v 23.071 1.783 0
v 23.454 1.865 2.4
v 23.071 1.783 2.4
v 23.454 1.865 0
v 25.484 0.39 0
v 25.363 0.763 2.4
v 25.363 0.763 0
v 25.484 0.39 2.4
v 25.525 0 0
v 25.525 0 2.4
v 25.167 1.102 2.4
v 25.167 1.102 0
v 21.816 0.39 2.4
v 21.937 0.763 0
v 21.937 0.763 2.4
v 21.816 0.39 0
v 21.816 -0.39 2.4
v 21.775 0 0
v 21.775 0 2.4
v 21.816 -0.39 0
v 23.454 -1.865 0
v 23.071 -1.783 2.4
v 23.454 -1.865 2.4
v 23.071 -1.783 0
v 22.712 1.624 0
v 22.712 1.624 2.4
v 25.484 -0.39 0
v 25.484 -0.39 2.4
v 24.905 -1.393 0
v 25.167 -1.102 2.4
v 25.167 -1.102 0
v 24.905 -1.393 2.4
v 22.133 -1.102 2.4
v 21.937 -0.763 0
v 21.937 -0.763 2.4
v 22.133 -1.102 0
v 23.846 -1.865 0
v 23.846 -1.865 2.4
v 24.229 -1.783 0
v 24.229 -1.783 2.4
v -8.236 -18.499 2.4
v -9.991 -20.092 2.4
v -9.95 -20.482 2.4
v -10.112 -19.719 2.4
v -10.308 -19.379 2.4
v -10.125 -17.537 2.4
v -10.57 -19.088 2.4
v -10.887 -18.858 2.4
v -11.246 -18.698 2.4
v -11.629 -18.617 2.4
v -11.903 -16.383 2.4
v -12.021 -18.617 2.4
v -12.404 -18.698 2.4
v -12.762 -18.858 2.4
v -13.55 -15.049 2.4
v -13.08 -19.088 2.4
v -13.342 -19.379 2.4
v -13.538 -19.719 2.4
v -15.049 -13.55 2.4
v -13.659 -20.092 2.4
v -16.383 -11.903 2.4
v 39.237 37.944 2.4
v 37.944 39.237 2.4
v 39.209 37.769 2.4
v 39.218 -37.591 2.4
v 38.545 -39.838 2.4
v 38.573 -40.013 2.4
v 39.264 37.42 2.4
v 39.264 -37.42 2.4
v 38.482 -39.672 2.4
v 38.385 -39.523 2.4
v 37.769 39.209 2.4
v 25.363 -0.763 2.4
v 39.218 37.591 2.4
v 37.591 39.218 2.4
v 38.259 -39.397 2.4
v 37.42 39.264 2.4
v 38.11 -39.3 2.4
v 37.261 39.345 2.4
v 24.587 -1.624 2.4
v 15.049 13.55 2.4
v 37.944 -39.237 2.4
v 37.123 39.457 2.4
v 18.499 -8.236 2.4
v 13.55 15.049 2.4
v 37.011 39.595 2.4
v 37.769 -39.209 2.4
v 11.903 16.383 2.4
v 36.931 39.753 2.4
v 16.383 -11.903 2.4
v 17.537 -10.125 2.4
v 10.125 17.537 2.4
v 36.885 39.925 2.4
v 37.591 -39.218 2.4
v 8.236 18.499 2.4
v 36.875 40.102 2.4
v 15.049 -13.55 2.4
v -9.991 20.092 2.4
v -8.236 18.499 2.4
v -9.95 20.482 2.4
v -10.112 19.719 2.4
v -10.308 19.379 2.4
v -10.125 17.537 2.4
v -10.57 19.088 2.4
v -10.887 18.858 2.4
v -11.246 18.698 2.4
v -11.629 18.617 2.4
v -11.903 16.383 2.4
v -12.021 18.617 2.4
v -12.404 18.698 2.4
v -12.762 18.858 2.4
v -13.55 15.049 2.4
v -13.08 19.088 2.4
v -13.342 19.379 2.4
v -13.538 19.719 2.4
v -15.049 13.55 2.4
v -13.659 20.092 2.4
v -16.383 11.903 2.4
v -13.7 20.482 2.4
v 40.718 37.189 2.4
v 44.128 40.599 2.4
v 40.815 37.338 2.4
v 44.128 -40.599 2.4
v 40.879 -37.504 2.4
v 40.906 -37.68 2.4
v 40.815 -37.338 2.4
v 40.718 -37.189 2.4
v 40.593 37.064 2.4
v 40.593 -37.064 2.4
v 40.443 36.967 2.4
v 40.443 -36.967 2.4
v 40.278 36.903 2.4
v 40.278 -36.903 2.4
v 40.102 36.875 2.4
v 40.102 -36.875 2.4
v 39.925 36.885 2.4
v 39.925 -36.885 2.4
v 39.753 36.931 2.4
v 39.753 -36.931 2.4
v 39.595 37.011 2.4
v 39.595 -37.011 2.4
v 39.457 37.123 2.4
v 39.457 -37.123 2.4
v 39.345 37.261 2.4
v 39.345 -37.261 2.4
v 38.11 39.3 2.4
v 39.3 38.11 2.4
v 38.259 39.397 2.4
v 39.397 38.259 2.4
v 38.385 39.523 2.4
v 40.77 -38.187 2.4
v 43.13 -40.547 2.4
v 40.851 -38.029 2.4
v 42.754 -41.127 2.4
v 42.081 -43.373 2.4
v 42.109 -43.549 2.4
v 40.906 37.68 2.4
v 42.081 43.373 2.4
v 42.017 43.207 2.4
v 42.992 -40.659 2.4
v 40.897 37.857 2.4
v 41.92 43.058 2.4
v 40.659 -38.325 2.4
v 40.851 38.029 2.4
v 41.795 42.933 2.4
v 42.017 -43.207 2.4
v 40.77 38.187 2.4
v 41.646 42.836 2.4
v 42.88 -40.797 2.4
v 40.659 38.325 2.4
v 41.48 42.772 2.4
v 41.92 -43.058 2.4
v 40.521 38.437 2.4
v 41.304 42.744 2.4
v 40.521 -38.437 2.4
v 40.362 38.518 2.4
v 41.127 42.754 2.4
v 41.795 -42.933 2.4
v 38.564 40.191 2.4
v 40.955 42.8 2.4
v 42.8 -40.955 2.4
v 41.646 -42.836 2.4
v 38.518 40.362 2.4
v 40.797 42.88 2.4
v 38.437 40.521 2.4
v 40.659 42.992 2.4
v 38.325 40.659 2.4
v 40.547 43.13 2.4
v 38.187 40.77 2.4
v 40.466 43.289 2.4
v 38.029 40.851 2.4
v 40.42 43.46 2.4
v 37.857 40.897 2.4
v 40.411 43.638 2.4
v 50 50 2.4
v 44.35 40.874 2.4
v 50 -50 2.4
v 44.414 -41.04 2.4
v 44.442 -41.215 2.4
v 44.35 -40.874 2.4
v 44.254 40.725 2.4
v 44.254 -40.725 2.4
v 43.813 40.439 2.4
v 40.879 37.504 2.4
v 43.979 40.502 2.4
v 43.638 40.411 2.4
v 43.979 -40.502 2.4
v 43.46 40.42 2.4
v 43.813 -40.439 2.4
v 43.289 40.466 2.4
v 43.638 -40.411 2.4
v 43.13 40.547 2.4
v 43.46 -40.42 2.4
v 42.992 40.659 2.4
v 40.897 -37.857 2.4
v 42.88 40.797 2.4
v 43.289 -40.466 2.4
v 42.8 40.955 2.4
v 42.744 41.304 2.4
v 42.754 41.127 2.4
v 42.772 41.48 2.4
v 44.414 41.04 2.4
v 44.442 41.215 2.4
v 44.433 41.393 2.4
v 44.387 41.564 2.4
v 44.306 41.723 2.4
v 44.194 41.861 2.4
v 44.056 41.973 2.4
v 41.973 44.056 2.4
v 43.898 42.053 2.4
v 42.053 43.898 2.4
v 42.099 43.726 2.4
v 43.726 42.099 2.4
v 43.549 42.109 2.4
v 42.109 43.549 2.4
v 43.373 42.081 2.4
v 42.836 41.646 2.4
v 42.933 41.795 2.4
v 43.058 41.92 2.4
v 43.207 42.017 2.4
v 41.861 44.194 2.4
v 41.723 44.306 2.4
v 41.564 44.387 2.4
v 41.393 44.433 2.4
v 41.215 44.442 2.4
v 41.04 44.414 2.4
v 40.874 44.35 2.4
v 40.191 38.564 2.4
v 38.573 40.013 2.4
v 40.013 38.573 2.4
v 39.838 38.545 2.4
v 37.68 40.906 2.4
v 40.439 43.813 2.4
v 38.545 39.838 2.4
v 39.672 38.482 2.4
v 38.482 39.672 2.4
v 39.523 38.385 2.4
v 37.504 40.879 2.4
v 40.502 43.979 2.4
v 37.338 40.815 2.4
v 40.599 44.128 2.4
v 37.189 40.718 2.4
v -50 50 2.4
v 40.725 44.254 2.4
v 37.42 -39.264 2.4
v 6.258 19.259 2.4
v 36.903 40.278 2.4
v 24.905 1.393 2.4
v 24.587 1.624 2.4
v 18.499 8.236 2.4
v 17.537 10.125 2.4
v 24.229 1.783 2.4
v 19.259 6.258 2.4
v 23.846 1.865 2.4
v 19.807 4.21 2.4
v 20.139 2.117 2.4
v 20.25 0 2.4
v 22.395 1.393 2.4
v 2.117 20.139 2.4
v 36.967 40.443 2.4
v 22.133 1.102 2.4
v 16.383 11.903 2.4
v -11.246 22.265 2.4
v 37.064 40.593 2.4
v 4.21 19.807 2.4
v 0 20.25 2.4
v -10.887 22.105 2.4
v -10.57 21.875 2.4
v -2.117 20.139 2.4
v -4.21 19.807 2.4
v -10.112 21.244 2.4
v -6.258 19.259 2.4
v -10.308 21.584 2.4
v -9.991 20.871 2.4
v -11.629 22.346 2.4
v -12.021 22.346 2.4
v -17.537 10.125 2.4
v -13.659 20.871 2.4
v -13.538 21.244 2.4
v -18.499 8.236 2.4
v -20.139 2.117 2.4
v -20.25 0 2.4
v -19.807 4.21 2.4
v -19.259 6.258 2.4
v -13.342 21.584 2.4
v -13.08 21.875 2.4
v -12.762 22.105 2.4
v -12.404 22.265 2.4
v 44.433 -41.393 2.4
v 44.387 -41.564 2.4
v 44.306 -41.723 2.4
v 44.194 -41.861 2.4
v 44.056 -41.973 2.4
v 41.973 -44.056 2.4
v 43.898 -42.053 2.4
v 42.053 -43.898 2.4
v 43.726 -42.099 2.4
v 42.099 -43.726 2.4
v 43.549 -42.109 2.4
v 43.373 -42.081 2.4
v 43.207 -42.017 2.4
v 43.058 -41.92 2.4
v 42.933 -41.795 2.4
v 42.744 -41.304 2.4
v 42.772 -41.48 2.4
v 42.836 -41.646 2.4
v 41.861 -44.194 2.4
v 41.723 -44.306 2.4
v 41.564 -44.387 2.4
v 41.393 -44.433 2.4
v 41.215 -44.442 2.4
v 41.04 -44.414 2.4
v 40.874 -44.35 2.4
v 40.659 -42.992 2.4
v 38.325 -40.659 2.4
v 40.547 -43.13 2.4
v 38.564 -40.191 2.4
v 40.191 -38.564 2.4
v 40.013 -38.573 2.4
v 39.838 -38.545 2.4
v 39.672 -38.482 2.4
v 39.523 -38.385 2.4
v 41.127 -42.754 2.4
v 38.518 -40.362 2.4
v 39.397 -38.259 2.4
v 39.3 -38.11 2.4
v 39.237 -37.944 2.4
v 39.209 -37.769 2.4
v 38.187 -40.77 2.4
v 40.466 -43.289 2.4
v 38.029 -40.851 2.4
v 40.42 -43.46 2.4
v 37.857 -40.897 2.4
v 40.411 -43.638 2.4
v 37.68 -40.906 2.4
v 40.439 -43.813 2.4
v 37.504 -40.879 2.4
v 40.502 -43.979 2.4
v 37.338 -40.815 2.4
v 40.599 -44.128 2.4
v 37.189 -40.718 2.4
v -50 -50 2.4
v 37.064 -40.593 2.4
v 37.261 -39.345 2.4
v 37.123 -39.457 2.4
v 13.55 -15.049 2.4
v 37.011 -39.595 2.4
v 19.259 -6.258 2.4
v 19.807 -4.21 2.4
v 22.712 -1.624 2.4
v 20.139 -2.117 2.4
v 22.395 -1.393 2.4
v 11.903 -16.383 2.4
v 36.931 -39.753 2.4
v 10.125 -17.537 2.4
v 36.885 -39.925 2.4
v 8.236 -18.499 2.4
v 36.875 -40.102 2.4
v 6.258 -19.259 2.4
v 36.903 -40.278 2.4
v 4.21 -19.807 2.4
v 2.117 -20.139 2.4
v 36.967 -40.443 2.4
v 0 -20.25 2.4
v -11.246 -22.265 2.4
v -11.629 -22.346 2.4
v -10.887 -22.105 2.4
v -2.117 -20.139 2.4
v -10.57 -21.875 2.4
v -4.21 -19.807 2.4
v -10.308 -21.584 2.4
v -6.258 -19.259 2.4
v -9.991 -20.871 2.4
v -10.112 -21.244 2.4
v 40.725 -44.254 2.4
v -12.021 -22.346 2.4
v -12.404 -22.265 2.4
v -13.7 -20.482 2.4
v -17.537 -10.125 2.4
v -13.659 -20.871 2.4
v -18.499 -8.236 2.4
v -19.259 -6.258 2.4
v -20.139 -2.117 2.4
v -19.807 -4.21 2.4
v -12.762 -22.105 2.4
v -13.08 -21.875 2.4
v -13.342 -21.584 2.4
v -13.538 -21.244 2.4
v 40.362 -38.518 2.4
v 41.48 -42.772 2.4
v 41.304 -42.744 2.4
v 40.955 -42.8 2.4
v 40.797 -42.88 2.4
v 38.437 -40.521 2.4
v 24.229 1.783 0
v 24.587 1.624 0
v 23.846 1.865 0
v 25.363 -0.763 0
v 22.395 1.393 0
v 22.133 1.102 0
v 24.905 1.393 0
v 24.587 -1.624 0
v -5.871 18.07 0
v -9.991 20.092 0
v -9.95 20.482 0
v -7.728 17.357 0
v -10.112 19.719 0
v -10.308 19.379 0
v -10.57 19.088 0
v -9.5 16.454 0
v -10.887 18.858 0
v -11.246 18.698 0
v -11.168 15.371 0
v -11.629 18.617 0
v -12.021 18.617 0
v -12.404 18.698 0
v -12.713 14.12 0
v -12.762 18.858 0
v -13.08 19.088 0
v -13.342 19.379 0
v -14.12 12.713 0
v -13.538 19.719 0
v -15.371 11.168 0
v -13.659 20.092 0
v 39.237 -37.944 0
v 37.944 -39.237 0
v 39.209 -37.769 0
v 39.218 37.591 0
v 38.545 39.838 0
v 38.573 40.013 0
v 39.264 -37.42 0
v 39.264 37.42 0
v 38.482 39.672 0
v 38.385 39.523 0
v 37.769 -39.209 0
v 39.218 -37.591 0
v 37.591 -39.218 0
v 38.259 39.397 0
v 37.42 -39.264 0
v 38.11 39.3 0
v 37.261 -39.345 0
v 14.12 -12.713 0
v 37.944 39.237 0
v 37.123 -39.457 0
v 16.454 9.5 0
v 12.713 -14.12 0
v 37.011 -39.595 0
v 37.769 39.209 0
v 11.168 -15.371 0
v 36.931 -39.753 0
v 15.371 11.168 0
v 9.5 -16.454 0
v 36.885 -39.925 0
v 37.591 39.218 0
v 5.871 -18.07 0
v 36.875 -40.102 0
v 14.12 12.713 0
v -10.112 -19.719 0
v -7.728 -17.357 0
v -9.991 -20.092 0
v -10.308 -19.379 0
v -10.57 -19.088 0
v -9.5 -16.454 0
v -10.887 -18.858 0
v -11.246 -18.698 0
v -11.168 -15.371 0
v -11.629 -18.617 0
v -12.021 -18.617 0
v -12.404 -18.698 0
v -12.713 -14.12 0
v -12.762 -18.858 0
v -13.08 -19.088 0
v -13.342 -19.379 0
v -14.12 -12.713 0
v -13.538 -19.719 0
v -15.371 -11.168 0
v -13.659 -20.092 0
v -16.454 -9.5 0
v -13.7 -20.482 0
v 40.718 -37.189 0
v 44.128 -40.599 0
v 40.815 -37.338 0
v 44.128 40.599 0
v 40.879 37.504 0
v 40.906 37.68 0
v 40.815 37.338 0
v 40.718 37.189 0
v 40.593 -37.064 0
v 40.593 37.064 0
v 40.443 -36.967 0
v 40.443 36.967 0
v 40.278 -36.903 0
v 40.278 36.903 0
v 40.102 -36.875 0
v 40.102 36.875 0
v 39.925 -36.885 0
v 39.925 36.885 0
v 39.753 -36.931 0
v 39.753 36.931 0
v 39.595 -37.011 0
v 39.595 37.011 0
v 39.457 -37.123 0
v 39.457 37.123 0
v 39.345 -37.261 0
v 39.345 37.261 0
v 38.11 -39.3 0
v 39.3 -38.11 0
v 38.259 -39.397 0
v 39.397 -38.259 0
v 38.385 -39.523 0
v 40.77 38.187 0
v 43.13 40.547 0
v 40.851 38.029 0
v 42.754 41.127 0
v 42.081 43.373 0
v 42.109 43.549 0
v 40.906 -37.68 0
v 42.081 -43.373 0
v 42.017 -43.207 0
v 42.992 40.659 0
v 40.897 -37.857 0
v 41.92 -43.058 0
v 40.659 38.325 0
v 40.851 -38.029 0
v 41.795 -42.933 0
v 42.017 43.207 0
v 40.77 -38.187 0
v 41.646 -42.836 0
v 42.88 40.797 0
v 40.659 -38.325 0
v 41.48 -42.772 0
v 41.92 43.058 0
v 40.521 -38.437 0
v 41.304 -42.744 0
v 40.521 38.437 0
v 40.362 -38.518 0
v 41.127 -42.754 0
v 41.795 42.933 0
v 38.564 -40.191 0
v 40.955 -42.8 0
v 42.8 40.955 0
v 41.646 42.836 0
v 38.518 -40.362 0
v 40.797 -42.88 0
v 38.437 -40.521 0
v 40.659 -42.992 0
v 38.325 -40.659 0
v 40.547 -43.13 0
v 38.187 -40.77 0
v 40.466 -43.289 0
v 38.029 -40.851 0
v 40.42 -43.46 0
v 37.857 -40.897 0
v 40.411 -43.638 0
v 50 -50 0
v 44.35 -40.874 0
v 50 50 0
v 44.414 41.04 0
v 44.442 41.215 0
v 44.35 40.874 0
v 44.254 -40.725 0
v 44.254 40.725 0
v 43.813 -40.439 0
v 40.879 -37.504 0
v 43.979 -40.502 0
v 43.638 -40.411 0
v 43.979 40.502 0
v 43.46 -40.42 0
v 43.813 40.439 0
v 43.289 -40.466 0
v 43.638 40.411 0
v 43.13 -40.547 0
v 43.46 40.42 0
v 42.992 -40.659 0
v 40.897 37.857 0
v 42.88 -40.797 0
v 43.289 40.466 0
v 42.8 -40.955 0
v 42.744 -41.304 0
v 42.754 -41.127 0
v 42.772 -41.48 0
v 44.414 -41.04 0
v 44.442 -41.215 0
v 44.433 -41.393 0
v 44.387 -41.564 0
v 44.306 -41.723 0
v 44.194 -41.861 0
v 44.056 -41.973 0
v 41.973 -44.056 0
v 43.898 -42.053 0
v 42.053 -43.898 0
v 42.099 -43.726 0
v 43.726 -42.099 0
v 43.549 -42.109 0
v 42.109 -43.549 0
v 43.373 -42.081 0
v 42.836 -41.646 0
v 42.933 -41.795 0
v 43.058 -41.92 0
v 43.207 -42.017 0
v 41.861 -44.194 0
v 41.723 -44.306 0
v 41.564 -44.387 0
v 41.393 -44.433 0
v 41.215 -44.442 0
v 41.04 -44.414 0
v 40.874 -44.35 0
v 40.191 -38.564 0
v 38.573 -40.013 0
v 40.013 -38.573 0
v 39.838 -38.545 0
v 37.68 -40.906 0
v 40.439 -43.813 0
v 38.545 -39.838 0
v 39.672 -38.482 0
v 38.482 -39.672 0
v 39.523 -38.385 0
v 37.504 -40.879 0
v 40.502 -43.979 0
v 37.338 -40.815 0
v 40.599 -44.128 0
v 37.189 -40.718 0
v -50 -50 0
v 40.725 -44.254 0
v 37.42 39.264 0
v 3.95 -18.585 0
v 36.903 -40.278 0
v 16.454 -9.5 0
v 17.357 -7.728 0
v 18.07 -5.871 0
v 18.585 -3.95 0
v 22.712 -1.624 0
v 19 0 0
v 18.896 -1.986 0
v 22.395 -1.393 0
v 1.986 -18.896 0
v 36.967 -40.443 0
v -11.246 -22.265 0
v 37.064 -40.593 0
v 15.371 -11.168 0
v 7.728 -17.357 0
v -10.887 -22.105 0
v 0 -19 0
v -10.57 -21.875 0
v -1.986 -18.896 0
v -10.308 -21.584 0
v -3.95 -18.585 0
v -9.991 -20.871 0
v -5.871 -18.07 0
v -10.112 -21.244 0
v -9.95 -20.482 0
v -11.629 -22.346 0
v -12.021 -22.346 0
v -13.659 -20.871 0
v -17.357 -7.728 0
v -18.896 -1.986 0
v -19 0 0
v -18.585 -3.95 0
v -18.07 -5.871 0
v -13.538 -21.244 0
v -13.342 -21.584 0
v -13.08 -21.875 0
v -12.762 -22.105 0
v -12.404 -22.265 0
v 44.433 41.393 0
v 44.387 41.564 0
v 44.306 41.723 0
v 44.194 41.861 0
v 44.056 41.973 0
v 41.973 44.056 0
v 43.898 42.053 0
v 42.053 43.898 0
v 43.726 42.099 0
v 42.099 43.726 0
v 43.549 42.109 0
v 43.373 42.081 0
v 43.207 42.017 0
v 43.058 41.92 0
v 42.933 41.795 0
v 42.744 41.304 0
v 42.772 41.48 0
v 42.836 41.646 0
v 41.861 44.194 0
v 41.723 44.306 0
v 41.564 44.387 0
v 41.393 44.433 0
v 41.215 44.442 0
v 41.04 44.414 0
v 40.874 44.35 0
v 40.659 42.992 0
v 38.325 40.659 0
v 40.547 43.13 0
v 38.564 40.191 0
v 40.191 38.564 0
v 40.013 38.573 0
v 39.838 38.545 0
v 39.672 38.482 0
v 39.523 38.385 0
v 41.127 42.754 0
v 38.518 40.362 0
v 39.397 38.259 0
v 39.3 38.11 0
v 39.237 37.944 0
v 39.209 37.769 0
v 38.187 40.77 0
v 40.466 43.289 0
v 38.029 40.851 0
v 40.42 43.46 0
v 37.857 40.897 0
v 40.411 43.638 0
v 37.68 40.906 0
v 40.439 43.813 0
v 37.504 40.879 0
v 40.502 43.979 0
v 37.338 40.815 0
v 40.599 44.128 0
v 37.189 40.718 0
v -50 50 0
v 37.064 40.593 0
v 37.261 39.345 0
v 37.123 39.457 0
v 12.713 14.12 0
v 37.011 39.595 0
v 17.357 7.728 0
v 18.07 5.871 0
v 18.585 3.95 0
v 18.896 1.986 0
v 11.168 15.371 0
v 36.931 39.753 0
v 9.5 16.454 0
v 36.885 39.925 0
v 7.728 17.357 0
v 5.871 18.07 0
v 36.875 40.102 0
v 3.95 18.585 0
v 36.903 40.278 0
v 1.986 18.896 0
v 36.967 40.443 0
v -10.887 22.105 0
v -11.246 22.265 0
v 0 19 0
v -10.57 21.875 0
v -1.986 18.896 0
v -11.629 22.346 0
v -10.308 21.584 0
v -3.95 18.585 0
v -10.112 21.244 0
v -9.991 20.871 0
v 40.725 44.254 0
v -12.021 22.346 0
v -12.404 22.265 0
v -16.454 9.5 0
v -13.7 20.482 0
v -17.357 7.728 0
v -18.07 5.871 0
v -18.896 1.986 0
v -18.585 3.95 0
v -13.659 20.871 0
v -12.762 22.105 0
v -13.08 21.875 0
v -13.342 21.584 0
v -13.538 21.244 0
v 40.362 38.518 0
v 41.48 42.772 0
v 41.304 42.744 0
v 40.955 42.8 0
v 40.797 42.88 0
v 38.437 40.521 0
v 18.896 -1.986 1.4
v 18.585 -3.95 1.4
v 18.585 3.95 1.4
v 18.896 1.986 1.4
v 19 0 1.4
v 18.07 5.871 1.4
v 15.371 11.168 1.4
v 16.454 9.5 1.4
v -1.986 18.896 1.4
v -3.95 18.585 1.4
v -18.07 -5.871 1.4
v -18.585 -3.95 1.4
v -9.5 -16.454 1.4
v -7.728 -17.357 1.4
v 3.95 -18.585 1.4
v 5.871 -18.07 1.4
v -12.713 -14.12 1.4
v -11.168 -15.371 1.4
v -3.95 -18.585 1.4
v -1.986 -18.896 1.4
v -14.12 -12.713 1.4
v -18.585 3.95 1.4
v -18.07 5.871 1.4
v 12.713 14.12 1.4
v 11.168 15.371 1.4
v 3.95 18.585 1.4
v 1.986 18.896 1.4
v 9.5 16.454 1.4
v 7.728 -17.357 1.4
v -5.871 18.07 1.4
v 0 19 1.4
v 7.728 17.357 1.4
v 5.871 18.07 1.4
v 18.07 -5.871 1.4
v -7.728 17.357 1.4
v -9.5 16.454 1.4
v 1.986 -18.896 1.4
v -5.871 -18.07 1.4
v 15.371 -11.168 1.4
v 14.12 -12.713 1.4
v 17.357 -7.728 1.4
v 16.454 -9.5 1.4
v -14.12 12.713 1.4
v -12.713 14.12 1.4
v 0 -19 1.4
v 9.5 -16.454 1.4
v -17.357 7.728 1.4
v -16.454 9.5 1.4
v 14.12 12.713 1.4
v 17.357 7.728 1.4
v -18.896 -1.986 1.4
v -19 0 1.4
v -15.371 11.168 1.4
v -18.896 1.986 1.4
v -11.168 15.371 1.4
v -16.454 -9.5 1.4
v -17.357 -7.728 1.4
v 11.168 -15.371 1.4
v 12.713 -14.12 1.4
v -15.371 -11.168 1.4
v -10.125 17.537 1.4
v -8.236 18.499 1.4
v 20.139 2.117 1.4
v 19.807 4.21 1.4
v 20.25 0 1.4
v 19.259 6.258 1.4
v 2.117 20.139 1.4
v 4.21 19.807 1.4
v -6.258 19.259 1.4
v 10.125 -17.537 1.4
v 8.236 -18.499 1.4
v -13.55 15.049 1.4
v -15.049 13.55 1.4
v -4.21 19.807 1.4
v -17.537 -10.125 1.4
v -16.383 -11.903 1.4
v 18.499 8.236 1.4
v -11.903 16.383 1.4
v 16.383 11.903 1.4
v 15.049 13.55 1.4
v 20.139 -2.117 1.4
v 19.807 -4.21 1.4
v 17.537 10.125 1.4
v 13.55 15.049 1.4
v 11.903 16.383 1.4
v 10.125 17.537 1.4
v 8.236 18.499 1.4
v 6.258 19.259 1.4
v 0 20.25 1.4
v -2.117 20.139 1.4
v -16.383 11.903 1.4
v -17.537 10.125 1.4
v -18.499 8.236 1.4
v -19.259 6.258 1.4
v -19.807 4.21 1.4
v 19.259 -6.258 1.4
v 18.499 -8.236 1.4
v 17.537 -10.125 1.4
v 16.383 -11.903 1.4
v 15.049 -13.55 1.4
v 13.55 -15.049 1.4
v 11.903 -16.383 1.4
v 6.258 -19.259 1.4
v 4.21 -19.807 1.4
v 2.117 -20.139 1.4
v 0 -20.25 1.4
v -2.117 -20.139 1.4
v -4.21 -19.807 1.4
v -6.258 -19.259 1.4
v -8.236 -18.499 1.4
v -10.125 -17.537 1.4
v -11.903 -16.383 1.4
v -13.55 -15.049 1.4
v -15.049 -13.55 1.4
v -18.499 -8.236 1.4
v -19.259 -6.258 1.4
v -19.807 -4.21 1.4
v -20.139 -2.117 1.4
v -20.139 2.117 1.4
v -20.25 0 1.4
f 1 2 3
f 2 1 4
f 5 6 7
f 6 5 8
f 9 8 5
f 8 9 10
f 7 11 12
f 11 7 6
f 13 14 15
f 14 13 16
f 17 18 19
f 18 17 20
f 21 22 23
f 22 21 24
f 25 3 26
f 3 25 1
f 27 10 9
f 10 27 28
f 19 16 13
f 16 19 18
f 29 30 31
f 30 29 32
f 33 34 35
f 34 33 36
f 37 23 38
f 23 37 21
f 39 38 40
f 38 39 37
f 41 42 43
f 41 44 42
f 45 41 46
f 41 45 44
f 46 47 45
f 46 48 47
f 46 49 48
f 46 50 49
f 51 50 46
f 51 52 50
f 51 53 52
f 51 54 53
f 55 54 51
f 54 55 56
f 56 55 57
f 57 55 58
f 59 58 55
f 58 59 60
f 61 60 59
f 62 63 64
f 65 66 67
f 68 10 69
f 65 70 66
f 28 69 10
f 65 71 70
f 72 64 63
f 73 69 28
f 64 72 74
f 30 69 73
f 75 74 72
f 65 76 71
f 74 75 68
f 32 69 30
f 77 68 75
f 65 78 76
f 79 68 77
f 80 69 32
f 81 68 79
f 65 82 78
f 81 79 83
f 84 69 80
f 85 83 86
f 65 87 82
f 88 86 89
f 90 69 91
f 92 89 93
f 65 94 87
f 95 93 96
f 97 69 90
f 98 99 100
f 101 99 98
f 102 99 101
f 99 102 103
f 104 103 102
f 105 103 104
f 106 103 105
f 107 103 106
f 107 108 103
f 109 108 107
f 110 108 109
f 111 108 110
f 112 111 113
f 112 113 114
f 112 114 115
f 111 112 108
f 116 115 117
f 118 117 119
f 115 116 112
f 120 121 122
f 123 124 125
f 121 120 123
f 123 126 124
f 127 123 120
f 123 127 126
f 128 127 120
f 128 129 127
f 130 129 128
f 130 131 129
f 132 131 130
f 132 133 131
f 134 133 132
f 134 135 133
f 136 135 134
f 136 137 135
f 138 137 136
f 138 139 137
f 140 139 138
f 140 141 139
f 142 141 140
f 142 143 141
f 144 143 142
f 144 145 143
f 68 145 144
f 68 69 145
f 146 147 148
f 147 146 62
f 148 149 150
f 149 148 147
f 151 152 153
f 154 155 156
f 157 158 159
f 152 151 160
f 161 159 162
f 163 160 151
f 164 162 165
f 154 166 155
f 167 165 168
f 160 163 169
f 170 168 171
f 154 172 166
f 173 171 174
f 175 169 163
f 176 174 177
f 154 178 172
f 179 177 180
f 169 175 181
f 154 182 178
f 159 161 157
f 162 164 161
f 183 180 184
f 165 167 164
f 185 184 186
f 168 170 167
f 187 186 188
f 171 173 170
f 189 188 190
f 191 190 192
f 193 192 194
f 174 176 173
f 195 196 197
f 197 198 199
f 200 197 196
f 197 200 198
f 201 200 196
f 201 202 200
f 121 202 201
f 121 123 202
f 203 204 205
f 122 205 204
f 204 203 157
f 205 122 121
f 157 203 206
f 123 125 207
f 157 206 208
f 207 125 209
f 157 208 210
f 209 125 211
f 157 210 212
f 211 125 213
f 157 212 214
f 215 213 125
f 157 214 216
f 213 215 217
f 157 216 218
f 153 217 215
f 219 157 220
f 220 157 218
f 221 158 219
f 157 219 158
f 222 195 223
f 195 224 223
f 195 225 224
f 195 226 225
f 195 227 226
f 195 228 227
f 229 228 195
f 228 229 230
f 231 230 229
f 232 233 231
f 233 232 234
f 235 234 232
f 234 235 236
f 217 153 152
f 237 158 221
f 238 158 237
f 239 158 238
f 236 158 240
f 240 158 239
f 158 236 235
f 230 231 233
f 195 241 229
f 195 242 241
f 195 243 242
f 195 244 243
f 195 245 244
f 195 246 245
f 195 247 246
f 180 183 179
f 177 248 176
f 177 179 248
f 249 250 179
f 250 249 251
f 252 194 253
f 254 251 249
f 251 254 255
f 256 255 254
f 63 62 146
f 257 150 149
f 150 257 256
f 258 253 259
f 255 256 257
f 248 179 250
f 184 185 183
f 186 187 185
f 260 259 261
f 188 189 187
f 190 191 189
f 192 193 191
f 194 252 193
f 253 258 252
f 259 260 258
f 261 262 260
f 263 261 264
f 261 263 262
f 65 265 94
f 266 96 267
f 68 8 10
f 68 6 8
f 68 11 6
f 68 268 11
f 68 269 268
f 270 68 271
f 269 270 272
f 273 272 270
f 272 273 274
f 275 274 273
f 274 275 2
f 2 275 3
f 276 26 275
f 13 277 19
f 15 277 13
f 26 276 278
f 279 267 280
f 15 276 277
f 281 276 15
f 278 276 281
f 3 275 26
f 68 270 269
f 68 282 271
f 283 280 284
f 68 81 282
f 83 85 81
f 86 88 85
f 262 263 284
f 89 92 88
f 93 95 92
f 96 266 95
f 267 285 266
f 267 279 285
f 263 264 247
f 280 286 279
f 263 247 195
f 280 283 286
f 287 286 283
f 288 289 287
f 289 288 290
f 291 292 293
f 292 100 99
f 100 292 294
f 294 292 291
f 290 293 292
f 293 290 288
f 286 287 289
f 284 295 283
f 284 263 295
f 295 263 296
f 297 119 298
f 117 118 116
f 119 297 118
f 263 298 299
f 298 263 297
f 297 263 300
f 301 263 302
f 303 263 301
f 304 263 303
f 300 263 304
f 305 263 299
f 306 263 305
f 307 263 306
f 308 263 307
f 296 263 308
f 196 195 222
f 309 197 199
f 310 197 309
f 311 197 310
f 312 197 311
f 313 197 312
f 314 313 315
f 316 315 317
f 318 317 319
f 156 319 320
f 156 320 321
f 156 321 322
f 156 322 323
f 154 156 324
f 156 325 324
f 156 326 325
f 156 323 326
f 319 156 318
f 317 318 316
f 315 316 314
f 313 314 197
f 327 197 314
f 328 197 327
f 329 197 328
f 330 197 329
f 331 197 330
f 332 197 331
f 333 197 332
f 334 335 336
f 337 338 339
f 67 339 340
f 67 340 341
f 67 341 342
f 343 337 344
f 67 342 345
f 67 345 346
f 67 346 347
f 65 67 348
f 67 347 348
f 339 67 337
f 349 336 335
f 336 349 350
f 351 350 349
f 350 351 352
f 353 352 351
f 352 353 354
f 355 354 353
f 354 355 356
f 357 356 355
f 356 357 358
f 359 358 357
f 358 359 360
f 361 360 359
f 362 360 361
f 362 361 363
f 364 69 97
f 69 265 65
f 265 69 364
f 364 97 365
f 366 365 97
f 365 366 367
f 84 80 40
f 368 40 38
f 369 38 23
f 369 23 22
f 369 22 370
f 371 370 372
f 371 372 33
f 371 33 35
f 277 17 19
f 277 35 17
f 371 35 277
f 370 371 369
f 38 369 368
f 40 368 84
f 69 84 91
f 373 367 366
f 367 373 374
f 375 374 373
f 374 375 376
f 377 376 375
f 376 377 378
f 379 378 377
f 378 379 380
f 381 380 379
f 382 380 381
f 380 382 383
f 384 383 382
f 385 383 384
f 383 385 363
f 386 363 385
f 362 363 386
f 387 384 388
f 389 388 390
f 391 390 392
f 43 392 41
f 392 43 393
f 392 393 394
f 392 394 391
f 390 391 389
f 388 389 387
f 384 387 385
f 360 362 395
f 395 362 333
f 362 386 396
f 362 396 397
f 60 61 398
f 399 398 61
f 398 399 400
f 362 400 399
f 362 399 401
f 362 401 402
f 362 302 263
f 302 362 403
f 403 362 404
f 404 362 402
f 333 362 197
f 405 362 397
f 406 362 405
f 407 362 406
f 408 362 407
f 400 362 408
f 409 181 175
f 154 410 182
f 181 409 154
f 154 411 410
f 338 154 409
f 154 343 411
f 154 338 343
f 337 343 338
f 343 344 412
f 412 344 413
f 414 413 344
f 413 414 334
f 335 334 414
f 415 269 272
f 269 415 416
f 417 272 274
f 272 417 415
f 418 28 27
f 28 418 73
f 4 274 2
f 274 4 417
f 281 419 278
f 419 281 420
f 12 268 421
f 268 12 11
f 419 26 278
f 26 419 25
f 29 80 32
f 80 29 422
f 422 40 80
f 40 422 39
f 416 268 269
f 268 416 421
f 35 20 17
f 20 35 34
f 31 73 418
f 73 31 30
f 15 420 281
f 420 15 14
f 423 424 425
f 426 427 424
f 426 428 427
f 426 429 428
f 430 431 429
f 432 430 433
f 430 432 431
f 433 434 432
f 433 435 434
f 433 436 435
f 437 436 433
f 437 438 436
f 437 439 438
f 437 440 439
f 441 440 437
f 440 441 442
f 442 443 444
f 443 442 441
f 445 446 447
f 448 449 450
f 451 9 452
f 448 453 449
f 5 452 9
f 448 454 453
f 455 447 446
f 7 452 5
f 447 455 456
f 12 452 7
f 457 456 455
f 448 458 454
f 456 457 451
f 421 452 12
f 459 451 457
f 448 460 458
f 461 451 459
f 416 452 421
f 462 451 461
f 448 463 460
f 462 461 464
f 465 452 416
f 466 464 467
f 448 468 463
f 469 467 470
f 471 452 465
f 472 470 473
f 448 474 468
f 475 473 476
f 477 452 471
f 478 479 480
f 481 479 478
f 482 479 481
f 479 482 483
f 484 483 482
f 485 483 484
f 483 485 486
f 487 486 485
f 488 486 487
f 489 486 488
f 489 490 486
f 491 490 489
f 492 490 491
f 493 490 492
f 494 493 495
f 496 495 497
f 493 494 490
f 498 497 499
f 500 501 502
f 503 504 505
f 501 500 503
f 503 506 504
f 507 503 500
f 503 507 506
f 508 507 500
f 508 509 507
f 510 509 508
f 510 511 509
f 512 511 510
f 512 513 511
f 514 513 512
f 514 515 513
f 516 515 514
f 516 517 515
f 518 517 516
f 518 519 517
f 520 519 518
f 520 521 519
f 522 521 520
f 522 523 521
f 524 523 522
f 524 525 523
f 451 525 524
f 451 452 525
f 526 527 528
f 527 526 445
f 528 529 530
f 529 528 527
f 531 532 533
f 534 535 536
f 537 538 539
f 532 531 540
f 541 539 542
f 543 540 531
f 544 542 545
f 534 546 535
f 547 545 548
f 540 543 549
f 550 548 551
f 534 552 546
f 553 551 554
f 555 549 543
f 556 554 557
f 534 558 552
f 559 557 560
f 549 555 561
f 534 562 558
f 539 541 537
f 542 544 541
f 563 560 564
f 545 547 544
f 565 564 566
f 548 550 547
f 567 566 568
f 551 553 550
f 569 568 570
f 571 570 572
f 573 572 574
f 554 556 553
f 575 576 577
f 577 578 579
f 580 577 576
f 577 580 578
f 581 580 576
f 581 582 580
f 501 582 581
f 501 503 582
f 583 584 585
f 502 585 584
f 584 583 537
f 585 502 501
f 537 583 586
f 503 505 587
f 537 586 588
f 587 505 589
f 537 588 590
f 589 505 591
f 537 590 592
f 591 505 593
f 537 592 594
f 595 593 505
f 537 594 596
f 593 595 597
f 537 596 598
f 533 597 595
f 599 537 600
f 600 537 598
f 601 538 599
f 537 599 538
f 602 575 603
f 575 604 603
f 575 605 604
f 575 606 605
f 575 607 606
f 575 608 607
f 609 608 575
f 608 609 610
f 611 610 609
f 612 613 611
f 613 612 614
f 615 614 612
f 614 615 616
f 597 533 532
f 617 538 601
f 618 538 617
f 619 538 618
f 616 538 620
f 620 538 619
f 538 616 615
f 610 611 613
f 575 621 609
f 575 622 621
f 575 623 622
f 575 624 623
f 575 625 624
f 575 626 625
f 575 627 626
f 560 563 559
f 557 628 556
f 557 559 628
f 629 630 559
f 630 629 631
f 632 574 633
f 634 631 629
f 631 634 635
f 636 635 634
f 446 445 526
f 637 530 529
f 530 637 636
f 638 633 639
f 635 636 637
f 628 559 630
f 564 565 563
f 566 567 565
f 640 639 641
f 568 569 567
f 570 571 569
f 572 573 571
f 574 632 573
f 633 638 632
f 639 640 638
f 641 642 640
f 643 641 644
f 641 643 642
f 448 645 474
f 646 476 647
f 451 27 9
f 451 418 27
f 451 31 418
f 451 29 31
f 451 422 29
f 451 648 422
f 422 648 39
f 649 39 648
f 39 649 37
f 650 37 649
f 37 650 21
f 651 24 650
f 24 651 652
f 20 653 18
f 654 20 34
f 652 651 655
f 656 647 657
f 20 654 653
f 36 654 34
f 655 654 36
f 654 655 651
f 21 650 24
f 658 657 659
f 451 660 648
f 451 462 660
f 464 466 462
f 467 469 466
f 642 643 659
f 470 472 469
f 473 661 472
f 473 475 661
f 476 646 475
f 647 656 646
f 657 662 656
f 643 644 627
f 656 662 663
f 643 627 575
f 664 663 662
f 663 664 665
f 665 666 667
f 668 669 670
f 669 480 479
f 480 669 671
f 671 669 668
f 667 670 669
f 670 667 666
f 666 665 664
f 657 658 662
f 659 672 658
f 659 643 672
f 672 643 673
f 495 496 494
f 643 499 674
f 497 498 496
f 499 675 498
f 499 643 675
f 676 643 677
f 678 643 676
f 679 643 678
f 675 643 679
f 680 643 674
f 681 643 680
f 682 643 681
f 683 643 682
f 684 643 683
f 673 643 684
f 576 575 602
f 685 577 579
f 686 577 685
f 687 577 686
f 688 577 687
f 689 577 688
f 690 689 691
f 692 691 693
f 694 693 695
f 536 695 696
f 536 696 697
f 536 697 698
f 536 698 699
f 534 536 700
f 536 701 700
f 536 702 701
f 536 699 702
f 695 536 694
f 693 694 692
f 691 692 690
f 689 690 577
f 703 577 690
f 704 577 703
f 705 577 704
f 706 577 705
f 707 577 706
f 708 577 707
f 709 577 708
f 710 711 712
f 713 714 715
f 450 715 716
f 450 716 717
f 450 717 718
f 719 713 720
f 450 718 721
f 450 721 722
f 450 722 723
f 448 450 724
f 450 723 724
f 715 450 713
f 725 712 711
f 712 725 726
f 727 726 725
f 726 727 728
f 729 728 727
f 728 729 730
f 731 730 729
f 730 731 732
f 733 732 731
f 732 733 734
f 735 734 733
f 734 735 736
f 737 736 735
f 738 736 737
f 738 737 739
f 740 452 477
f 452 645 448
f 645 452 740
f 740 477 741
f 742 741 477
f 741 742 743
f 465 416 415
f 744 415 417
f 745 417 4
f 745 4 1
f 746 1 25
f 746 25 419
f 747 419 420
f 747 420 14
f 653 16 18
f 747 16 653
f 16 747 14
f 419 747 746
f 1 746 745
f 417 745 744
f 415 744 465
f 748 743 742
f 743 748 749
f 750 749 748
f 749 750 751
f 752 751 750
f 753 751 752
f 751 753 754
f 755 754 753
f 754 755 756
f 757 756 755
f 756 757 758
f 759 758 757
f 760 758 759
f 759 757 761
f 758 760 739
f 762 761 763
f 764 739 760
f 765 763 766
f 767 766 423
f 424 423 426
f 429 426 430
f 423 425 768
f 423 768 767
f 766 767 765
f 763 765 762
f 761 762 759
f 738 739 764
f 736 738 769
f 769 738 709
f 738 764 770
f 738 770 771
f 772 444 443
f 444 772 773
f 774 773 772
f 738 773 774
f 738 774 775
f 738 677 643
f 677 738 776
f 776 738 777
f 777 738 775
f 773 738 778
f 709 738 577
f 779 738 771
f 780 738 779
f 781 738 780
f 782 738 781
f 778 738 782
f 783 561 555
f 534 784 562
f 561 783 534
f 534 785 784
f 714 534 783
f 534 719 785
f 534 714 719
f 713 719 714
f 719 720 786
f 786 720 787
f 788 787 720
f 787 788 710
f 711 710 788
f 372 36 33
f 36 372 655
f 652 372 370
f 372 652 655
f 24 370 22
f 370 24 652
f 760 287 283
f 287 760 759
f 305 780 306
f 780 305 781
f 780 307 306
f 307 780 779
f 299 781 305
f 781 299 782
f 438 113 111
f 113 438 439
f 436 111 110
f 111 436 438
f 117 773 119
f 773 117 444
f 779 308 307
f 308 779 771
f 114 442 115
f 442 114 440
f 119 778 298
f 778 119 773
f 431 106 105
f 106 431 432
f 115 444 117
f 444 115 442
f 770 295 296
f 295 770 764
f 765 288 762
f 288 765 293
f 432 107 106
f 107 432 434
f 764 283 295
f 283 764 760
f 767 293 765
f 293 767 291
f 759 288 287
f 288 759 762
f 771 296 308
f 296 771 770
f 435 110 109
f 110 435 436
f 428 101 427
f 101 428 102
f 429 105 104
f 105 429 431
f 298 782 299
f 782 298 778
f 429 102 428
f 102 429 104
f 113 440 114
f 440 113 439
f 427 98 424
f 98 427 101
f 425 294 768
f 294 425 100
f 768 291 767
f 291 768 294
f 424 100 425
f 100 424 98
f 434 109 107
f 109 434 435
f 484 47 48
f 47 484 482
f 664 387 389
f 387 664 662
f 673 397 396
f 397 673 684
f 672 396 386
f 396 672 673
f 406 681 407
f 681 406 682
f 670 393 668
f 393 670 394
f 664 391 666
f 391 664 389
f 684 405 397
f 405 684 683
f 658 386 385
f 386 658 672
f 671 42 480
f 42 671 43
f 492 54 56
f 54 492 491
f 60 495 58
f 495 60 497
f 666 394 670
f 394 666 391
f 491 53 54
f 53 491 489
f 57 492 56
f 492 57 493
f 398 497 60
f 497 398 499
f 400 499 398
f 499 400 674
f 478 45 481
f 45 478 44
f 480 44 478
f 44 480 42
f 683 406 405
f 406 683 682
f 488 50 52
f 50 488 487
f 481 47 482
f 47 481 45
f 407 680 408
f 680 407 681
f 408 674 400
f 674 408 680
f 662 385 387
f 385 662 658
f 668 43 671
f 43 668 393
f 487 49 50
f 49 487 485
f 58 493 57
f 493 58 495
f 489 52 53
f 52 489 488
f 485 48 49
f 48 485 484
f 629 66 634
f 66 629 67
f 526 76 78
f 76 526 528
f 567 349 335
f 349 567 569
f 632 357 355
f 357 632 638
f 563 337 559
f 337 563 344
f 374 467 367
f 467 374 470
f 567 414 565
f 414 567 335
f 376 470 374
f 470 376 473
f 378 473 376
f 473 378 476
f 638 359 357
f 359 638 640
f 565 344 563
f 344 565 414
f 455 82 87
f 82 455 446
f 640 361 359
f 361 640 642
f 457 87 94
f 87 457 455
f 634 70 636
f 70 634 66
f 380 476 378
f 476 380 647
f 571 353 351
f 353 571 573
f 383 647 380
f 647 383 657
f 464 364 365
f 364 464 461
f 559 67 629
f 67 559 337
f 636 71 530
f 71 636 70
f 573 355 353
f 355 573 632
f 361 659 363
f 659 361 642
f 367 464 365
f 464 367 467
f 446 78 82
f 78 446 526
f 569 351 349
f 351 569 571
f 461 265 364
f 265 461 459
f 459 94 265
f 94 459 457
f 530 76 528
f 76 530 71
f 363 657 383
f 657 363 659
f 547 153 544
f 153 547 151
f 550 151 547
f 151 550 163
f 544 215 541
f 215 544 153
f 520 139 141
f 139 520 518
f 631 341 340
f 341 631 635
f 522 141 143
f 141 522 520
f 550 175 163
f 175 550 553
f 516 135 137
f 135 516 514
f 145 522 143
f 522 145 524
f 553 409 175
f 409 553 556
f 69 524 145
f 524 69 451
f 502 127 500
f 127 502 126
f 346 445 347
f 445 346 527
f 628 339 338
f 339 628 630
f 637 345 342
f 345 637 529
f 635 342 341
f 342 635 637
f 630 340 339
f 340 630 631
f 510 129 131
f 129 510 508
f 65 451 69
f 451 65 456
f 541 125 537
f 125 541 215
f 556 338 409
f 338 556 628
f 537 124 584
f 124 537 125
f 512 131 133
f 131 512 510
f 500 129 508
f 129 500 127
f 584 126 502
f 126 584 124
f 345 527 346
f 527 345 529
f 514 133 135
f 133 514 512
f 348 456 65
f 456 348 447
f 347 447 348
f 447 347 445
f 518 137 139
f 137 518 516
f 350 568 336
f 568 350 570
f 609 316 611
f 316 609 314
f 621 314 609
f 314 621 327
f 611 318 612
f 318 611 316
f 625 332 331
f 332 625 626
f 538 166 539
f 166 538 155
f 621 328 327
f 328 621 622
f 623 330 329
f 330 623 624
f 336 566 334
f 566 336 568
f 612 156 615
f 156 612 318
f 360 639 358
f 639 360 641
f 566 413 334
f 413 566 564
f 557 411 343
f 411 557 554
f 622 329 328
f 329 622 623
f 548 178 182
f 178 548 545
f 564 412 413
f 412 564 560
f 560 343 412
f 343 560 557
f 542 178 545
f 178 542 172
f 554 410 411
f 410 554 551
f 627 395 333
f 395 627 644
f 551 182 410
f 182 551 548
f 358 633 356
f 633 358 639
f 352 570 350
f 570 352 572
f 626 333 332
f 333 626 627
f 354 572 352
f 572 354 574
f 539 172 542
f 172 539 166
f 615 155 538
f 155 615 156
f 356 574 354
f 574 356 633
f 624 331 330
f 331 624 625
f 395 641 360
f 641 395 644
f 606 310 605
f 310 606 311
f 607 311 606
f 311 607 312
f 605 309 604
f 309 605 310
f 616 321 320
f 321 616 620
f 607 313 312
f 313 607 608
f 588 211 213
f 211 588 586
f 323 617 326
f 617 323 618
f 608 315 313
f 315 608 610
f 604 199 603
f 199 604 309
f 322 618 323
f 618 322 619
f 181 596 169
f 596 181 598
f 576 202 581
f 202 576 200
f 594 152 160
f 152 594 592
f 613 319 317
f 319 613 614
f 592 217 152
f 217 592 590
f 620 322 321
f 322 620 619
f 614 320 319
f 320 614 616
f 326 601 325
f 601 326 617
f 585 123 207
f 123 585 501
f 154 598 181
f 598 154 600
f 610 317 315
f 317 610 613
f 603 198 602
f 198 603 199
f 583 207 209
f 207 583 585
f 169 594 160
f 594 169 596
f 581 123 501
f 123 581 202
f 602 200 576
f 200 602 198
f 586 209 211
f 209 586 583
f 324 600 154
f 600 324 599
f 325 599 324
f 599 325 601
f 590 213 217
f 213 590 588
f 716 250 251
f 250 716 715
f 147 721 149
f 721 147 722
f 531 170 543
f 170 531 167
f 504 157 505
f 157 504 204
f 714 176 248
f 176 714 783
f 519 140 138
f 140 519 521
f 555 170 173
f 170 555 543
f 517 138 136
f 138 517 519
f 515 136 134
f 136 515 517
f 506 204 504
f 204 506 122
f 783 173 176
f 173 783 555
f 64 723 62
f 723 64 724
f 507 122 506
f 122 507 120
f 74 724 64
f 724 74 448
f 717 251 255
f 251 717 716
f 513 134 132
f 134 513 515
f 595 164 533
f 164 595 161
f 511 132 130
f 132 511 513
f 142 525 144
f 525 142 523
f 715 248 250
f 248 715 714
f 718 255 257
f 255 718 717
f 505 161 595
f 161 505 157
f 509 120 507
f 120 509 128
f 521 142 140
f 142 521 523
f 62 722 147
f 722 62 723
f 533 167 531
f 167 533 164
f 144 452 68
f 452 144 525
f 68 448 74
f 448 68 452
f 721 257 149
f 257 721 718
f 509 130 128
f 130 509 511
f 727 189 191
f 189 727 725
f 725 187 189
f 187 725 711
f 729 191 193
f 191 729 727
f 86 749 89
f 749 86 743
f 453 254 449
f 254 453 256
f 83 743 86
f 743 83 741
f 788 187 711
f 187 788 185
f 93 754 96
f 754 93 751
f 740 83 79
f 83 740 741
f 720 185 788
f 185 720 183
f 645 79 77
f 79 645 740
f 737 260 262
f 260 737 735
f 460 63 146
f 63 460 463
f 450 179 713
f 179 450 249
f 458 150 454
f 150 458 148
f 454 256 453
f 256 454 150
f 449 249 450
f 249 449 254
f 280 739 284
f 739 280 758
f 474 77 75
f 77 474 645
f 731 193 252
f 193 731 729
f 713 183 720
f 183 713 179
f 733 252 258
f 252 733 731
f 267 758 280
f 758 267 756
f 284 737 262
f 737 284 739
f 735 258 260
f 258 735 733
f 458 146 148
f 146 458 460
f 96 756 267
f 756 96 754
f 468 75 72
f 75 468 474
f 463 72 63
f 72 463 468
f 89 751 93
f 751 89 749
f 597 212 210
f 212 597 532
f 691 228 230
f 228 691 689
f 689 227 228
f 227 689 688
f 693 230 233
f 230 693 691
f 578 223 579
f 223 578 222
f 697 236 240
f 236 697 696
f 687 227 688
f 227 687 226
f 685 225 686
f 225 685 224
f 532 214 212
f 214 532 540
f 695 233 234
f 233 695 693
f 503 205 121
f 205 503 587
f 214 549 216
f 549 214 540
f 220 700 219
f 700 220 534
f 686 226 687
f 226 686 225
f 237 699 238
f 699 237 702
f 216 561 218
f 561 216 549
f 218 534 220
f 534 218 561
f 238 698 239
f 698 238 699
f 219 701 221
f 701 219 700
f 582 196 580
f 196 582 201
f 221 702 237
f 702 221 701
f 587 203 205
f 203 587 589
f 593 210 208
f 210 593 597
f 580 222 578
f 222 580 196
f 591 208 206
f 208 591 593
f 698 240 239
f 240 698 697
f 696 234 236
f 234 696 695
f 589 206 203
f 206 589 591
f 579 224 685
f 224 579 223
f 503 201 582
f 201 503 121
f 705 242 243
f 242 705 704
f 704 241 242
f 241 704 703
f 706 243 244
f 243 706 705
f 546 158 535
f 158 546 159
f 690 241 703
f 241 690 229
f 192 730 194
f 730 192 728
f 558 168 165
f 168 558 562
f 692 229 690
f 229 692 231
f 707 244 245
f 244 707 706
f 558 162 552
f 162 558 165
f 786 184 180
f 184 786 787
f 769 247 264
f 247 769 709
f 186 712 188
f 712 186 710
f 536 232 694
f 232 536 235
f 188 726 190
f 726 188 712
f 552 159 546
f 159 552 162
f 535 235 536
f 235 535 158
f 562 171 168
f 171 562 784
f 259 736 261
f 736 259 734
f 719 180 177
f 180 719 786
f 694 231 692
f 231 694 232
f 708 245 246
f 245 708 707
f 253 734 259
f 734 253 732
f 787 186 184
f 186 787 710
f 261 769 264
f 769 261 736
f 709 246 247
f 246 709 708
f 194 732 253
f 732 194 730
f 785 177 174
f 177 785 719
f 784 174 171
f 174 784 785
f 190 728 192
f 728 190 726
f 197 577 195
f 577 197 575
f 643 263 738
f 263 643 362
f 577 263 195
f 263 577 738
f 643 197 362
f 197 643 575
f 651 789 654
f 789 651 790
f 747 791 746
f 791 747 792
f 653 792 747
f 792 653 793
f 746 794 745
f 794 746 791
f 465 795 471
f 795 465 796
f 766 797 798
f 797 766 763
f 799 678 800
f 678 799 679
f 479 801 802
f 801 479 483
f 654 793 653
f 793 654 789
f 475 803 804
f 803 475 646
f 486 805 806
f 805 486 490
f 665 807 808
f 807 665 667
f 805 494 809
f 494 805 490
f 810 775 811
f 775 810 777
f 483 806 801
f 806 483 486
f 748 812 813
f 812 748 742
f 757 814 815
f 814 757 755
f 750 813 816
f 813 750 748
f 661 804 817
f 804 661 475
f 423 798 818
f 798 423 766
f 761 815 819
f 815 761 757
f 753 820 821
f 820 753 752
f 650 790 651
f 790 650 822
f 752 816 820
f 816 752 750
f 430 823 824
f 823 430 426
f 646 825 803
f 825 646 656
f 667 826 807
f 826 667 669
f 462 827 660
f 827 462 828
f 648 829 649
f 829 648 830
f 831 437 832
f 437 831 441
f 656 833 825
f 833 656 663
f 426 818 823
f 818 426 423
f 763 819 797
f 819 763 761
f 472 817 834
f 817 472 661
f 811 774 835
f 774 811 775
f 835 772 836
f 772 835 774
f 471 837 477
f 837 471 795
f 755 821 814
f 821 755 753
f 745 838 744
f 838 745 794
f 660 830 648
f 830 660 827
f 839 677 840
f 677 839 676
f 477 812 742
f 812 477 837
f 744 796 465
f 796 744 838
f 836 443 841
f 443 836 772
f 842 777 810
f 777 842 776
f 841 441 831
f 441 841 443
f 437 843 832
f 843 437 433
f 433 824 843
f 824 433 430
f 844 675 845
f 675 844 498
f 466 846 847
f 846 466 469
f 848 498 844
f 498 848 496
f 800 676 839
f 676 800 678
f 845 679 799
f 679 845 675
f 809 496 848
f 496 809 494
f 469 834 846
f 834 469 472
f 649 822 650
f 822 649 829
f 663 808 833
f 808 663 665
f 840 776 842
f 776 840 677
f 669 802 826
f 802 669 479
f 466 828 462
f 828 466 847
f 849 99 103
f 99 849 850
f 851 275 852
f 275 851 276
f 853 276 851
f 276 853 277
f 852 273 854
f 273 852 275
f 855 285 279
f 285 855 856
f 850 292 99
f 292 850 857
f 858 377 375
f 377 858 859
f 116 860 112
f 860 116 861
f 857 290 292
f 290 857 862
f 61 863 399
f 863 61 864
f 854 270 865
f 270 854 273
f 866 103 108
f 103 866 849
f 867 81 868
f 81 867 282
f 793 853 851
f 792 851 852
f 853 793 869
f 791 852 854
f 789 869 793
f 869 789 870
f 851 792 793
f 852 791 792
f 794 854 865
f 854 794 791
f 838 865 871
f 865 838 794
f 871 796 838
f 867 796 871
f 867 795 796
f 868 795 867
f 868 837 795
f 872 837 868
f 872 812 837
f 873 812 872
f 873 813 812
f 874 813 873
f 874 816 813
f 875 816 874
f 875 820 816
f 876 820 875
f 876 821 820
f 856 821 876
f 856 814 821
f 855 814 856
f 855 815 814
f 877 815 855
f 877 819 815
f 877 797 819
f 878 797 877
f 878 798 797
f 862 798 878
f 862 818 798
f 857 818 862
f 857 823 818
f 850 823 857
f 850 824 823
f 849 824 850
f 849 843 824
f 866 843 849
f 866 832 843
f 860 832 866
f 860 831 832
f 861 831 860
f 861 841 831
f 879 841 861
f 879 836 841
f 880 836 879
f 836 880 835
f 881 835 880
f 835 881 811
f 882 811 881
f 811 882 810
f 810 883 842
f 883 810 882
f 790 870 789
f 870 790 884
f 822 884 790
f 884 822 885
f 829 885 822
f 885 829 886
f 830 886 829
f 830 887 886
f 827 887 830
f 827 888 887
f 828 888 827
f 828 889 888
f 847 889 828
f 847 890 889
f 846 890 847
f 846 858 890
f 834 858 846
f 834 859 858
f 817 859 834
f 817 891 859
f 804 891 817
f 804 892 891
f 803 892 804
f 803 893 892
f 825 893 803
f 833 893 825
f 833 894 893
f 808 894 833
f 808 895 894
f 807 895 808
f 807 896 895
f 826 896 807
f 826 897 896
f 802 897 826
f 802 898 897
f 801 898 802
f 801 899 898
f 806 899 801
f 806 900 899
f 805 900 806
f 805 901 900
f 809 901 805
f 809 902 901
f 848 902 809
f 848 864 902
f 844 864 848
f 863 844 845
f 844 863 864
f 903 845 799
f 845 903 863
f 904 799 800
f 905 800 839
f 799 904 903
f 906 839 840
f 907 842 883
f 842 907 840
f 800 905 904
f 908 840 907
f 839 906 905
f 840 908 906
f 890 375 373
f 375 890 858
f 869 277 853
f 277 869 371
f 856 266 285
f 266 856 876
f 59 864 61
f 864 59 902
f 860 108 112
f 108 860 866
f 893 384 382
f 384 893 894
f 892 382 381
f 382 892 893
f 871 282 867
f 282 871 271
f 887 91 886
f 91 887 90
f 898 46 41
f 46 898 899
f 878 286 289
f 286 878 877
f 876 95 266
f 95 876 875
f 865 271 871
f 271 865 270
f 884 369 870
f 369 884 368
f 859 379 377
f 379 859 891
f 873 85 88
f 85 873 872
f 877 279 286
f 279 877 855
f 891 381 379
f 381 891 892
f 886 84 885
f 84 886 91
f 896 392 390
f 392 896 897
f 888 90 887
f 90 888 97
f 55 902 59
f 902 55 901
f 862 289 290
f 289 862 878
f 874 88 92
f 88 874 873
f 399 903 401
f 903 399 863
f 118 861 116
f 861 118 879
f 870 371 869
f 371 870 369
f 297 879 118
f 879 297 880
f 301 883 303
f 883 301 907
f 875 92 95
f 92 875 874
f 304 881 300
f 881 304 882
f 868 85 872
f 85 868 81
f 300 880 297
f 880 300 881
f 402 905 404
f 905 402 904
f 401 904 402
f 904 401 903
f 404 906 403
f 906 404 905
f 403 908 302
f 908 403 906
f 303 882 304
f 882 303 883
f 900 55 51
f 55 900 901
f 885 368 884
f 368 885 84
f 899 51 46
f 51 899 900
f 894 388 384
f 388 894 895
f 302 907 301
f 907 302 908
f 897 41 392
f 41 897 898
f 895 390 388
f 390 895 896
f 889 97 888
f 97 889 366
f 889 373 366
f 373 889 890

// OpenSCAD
$fn = 30;
length = 100;
thickness = 2.4;
motor_ring_thickness = 1;
motor_ring_diameter = 40.5;
motor_diameter = 38;
screw_hole_diameter = 3.75;
screw_hole_dist = 23.65;
ldr_hole_diameter = 1.7;
ldr_hole_width = 3.3;
ldr_hole_length = 5;
ldr_hole_dist = 55;

difference(){
    translate([0,0,thickness/2])
    cube([length,length,thickness],center=true);
    cylinder(d=motor_diameter,h=thickness,$fn=60);
    translate([0,0,thickness-motor_ring_thickness])
    cylinder(d=motor_ring_diameter,h=motor_ring_thickness,$fn=60);
    for (angle = [0,120,240]){
        rotate(angle)
        translate([screw_hole_dist, 0, 0])
        cylinder(d=screw_hole_diameter,h=thickness);
    }
    for (angle = [-45, 45]){
        rotate(angle)
        translate([ldr_hole_dist, 0, 0])
        ldr_holes();
    }
}

module ldr_holes(){
    translate([0,-ldr_hole_width/2,0])
    cylinder(d=ldr_hole_diameter,h=thickness);
    translate([0, ldr_hole_width/2,0])
    cylinder(d=ldr_hole_diameter,h=thickness);
    translate([ldr_hole_length,-ldr_hole_width/2,0])
    cylinder(d=ldr_hole_diameter,h=thickness);
    translate([ldr_hole_length, ldr_hole_width/2,0])
    cylinder(d=ldr_hole_diameter,h=thickness);
}
